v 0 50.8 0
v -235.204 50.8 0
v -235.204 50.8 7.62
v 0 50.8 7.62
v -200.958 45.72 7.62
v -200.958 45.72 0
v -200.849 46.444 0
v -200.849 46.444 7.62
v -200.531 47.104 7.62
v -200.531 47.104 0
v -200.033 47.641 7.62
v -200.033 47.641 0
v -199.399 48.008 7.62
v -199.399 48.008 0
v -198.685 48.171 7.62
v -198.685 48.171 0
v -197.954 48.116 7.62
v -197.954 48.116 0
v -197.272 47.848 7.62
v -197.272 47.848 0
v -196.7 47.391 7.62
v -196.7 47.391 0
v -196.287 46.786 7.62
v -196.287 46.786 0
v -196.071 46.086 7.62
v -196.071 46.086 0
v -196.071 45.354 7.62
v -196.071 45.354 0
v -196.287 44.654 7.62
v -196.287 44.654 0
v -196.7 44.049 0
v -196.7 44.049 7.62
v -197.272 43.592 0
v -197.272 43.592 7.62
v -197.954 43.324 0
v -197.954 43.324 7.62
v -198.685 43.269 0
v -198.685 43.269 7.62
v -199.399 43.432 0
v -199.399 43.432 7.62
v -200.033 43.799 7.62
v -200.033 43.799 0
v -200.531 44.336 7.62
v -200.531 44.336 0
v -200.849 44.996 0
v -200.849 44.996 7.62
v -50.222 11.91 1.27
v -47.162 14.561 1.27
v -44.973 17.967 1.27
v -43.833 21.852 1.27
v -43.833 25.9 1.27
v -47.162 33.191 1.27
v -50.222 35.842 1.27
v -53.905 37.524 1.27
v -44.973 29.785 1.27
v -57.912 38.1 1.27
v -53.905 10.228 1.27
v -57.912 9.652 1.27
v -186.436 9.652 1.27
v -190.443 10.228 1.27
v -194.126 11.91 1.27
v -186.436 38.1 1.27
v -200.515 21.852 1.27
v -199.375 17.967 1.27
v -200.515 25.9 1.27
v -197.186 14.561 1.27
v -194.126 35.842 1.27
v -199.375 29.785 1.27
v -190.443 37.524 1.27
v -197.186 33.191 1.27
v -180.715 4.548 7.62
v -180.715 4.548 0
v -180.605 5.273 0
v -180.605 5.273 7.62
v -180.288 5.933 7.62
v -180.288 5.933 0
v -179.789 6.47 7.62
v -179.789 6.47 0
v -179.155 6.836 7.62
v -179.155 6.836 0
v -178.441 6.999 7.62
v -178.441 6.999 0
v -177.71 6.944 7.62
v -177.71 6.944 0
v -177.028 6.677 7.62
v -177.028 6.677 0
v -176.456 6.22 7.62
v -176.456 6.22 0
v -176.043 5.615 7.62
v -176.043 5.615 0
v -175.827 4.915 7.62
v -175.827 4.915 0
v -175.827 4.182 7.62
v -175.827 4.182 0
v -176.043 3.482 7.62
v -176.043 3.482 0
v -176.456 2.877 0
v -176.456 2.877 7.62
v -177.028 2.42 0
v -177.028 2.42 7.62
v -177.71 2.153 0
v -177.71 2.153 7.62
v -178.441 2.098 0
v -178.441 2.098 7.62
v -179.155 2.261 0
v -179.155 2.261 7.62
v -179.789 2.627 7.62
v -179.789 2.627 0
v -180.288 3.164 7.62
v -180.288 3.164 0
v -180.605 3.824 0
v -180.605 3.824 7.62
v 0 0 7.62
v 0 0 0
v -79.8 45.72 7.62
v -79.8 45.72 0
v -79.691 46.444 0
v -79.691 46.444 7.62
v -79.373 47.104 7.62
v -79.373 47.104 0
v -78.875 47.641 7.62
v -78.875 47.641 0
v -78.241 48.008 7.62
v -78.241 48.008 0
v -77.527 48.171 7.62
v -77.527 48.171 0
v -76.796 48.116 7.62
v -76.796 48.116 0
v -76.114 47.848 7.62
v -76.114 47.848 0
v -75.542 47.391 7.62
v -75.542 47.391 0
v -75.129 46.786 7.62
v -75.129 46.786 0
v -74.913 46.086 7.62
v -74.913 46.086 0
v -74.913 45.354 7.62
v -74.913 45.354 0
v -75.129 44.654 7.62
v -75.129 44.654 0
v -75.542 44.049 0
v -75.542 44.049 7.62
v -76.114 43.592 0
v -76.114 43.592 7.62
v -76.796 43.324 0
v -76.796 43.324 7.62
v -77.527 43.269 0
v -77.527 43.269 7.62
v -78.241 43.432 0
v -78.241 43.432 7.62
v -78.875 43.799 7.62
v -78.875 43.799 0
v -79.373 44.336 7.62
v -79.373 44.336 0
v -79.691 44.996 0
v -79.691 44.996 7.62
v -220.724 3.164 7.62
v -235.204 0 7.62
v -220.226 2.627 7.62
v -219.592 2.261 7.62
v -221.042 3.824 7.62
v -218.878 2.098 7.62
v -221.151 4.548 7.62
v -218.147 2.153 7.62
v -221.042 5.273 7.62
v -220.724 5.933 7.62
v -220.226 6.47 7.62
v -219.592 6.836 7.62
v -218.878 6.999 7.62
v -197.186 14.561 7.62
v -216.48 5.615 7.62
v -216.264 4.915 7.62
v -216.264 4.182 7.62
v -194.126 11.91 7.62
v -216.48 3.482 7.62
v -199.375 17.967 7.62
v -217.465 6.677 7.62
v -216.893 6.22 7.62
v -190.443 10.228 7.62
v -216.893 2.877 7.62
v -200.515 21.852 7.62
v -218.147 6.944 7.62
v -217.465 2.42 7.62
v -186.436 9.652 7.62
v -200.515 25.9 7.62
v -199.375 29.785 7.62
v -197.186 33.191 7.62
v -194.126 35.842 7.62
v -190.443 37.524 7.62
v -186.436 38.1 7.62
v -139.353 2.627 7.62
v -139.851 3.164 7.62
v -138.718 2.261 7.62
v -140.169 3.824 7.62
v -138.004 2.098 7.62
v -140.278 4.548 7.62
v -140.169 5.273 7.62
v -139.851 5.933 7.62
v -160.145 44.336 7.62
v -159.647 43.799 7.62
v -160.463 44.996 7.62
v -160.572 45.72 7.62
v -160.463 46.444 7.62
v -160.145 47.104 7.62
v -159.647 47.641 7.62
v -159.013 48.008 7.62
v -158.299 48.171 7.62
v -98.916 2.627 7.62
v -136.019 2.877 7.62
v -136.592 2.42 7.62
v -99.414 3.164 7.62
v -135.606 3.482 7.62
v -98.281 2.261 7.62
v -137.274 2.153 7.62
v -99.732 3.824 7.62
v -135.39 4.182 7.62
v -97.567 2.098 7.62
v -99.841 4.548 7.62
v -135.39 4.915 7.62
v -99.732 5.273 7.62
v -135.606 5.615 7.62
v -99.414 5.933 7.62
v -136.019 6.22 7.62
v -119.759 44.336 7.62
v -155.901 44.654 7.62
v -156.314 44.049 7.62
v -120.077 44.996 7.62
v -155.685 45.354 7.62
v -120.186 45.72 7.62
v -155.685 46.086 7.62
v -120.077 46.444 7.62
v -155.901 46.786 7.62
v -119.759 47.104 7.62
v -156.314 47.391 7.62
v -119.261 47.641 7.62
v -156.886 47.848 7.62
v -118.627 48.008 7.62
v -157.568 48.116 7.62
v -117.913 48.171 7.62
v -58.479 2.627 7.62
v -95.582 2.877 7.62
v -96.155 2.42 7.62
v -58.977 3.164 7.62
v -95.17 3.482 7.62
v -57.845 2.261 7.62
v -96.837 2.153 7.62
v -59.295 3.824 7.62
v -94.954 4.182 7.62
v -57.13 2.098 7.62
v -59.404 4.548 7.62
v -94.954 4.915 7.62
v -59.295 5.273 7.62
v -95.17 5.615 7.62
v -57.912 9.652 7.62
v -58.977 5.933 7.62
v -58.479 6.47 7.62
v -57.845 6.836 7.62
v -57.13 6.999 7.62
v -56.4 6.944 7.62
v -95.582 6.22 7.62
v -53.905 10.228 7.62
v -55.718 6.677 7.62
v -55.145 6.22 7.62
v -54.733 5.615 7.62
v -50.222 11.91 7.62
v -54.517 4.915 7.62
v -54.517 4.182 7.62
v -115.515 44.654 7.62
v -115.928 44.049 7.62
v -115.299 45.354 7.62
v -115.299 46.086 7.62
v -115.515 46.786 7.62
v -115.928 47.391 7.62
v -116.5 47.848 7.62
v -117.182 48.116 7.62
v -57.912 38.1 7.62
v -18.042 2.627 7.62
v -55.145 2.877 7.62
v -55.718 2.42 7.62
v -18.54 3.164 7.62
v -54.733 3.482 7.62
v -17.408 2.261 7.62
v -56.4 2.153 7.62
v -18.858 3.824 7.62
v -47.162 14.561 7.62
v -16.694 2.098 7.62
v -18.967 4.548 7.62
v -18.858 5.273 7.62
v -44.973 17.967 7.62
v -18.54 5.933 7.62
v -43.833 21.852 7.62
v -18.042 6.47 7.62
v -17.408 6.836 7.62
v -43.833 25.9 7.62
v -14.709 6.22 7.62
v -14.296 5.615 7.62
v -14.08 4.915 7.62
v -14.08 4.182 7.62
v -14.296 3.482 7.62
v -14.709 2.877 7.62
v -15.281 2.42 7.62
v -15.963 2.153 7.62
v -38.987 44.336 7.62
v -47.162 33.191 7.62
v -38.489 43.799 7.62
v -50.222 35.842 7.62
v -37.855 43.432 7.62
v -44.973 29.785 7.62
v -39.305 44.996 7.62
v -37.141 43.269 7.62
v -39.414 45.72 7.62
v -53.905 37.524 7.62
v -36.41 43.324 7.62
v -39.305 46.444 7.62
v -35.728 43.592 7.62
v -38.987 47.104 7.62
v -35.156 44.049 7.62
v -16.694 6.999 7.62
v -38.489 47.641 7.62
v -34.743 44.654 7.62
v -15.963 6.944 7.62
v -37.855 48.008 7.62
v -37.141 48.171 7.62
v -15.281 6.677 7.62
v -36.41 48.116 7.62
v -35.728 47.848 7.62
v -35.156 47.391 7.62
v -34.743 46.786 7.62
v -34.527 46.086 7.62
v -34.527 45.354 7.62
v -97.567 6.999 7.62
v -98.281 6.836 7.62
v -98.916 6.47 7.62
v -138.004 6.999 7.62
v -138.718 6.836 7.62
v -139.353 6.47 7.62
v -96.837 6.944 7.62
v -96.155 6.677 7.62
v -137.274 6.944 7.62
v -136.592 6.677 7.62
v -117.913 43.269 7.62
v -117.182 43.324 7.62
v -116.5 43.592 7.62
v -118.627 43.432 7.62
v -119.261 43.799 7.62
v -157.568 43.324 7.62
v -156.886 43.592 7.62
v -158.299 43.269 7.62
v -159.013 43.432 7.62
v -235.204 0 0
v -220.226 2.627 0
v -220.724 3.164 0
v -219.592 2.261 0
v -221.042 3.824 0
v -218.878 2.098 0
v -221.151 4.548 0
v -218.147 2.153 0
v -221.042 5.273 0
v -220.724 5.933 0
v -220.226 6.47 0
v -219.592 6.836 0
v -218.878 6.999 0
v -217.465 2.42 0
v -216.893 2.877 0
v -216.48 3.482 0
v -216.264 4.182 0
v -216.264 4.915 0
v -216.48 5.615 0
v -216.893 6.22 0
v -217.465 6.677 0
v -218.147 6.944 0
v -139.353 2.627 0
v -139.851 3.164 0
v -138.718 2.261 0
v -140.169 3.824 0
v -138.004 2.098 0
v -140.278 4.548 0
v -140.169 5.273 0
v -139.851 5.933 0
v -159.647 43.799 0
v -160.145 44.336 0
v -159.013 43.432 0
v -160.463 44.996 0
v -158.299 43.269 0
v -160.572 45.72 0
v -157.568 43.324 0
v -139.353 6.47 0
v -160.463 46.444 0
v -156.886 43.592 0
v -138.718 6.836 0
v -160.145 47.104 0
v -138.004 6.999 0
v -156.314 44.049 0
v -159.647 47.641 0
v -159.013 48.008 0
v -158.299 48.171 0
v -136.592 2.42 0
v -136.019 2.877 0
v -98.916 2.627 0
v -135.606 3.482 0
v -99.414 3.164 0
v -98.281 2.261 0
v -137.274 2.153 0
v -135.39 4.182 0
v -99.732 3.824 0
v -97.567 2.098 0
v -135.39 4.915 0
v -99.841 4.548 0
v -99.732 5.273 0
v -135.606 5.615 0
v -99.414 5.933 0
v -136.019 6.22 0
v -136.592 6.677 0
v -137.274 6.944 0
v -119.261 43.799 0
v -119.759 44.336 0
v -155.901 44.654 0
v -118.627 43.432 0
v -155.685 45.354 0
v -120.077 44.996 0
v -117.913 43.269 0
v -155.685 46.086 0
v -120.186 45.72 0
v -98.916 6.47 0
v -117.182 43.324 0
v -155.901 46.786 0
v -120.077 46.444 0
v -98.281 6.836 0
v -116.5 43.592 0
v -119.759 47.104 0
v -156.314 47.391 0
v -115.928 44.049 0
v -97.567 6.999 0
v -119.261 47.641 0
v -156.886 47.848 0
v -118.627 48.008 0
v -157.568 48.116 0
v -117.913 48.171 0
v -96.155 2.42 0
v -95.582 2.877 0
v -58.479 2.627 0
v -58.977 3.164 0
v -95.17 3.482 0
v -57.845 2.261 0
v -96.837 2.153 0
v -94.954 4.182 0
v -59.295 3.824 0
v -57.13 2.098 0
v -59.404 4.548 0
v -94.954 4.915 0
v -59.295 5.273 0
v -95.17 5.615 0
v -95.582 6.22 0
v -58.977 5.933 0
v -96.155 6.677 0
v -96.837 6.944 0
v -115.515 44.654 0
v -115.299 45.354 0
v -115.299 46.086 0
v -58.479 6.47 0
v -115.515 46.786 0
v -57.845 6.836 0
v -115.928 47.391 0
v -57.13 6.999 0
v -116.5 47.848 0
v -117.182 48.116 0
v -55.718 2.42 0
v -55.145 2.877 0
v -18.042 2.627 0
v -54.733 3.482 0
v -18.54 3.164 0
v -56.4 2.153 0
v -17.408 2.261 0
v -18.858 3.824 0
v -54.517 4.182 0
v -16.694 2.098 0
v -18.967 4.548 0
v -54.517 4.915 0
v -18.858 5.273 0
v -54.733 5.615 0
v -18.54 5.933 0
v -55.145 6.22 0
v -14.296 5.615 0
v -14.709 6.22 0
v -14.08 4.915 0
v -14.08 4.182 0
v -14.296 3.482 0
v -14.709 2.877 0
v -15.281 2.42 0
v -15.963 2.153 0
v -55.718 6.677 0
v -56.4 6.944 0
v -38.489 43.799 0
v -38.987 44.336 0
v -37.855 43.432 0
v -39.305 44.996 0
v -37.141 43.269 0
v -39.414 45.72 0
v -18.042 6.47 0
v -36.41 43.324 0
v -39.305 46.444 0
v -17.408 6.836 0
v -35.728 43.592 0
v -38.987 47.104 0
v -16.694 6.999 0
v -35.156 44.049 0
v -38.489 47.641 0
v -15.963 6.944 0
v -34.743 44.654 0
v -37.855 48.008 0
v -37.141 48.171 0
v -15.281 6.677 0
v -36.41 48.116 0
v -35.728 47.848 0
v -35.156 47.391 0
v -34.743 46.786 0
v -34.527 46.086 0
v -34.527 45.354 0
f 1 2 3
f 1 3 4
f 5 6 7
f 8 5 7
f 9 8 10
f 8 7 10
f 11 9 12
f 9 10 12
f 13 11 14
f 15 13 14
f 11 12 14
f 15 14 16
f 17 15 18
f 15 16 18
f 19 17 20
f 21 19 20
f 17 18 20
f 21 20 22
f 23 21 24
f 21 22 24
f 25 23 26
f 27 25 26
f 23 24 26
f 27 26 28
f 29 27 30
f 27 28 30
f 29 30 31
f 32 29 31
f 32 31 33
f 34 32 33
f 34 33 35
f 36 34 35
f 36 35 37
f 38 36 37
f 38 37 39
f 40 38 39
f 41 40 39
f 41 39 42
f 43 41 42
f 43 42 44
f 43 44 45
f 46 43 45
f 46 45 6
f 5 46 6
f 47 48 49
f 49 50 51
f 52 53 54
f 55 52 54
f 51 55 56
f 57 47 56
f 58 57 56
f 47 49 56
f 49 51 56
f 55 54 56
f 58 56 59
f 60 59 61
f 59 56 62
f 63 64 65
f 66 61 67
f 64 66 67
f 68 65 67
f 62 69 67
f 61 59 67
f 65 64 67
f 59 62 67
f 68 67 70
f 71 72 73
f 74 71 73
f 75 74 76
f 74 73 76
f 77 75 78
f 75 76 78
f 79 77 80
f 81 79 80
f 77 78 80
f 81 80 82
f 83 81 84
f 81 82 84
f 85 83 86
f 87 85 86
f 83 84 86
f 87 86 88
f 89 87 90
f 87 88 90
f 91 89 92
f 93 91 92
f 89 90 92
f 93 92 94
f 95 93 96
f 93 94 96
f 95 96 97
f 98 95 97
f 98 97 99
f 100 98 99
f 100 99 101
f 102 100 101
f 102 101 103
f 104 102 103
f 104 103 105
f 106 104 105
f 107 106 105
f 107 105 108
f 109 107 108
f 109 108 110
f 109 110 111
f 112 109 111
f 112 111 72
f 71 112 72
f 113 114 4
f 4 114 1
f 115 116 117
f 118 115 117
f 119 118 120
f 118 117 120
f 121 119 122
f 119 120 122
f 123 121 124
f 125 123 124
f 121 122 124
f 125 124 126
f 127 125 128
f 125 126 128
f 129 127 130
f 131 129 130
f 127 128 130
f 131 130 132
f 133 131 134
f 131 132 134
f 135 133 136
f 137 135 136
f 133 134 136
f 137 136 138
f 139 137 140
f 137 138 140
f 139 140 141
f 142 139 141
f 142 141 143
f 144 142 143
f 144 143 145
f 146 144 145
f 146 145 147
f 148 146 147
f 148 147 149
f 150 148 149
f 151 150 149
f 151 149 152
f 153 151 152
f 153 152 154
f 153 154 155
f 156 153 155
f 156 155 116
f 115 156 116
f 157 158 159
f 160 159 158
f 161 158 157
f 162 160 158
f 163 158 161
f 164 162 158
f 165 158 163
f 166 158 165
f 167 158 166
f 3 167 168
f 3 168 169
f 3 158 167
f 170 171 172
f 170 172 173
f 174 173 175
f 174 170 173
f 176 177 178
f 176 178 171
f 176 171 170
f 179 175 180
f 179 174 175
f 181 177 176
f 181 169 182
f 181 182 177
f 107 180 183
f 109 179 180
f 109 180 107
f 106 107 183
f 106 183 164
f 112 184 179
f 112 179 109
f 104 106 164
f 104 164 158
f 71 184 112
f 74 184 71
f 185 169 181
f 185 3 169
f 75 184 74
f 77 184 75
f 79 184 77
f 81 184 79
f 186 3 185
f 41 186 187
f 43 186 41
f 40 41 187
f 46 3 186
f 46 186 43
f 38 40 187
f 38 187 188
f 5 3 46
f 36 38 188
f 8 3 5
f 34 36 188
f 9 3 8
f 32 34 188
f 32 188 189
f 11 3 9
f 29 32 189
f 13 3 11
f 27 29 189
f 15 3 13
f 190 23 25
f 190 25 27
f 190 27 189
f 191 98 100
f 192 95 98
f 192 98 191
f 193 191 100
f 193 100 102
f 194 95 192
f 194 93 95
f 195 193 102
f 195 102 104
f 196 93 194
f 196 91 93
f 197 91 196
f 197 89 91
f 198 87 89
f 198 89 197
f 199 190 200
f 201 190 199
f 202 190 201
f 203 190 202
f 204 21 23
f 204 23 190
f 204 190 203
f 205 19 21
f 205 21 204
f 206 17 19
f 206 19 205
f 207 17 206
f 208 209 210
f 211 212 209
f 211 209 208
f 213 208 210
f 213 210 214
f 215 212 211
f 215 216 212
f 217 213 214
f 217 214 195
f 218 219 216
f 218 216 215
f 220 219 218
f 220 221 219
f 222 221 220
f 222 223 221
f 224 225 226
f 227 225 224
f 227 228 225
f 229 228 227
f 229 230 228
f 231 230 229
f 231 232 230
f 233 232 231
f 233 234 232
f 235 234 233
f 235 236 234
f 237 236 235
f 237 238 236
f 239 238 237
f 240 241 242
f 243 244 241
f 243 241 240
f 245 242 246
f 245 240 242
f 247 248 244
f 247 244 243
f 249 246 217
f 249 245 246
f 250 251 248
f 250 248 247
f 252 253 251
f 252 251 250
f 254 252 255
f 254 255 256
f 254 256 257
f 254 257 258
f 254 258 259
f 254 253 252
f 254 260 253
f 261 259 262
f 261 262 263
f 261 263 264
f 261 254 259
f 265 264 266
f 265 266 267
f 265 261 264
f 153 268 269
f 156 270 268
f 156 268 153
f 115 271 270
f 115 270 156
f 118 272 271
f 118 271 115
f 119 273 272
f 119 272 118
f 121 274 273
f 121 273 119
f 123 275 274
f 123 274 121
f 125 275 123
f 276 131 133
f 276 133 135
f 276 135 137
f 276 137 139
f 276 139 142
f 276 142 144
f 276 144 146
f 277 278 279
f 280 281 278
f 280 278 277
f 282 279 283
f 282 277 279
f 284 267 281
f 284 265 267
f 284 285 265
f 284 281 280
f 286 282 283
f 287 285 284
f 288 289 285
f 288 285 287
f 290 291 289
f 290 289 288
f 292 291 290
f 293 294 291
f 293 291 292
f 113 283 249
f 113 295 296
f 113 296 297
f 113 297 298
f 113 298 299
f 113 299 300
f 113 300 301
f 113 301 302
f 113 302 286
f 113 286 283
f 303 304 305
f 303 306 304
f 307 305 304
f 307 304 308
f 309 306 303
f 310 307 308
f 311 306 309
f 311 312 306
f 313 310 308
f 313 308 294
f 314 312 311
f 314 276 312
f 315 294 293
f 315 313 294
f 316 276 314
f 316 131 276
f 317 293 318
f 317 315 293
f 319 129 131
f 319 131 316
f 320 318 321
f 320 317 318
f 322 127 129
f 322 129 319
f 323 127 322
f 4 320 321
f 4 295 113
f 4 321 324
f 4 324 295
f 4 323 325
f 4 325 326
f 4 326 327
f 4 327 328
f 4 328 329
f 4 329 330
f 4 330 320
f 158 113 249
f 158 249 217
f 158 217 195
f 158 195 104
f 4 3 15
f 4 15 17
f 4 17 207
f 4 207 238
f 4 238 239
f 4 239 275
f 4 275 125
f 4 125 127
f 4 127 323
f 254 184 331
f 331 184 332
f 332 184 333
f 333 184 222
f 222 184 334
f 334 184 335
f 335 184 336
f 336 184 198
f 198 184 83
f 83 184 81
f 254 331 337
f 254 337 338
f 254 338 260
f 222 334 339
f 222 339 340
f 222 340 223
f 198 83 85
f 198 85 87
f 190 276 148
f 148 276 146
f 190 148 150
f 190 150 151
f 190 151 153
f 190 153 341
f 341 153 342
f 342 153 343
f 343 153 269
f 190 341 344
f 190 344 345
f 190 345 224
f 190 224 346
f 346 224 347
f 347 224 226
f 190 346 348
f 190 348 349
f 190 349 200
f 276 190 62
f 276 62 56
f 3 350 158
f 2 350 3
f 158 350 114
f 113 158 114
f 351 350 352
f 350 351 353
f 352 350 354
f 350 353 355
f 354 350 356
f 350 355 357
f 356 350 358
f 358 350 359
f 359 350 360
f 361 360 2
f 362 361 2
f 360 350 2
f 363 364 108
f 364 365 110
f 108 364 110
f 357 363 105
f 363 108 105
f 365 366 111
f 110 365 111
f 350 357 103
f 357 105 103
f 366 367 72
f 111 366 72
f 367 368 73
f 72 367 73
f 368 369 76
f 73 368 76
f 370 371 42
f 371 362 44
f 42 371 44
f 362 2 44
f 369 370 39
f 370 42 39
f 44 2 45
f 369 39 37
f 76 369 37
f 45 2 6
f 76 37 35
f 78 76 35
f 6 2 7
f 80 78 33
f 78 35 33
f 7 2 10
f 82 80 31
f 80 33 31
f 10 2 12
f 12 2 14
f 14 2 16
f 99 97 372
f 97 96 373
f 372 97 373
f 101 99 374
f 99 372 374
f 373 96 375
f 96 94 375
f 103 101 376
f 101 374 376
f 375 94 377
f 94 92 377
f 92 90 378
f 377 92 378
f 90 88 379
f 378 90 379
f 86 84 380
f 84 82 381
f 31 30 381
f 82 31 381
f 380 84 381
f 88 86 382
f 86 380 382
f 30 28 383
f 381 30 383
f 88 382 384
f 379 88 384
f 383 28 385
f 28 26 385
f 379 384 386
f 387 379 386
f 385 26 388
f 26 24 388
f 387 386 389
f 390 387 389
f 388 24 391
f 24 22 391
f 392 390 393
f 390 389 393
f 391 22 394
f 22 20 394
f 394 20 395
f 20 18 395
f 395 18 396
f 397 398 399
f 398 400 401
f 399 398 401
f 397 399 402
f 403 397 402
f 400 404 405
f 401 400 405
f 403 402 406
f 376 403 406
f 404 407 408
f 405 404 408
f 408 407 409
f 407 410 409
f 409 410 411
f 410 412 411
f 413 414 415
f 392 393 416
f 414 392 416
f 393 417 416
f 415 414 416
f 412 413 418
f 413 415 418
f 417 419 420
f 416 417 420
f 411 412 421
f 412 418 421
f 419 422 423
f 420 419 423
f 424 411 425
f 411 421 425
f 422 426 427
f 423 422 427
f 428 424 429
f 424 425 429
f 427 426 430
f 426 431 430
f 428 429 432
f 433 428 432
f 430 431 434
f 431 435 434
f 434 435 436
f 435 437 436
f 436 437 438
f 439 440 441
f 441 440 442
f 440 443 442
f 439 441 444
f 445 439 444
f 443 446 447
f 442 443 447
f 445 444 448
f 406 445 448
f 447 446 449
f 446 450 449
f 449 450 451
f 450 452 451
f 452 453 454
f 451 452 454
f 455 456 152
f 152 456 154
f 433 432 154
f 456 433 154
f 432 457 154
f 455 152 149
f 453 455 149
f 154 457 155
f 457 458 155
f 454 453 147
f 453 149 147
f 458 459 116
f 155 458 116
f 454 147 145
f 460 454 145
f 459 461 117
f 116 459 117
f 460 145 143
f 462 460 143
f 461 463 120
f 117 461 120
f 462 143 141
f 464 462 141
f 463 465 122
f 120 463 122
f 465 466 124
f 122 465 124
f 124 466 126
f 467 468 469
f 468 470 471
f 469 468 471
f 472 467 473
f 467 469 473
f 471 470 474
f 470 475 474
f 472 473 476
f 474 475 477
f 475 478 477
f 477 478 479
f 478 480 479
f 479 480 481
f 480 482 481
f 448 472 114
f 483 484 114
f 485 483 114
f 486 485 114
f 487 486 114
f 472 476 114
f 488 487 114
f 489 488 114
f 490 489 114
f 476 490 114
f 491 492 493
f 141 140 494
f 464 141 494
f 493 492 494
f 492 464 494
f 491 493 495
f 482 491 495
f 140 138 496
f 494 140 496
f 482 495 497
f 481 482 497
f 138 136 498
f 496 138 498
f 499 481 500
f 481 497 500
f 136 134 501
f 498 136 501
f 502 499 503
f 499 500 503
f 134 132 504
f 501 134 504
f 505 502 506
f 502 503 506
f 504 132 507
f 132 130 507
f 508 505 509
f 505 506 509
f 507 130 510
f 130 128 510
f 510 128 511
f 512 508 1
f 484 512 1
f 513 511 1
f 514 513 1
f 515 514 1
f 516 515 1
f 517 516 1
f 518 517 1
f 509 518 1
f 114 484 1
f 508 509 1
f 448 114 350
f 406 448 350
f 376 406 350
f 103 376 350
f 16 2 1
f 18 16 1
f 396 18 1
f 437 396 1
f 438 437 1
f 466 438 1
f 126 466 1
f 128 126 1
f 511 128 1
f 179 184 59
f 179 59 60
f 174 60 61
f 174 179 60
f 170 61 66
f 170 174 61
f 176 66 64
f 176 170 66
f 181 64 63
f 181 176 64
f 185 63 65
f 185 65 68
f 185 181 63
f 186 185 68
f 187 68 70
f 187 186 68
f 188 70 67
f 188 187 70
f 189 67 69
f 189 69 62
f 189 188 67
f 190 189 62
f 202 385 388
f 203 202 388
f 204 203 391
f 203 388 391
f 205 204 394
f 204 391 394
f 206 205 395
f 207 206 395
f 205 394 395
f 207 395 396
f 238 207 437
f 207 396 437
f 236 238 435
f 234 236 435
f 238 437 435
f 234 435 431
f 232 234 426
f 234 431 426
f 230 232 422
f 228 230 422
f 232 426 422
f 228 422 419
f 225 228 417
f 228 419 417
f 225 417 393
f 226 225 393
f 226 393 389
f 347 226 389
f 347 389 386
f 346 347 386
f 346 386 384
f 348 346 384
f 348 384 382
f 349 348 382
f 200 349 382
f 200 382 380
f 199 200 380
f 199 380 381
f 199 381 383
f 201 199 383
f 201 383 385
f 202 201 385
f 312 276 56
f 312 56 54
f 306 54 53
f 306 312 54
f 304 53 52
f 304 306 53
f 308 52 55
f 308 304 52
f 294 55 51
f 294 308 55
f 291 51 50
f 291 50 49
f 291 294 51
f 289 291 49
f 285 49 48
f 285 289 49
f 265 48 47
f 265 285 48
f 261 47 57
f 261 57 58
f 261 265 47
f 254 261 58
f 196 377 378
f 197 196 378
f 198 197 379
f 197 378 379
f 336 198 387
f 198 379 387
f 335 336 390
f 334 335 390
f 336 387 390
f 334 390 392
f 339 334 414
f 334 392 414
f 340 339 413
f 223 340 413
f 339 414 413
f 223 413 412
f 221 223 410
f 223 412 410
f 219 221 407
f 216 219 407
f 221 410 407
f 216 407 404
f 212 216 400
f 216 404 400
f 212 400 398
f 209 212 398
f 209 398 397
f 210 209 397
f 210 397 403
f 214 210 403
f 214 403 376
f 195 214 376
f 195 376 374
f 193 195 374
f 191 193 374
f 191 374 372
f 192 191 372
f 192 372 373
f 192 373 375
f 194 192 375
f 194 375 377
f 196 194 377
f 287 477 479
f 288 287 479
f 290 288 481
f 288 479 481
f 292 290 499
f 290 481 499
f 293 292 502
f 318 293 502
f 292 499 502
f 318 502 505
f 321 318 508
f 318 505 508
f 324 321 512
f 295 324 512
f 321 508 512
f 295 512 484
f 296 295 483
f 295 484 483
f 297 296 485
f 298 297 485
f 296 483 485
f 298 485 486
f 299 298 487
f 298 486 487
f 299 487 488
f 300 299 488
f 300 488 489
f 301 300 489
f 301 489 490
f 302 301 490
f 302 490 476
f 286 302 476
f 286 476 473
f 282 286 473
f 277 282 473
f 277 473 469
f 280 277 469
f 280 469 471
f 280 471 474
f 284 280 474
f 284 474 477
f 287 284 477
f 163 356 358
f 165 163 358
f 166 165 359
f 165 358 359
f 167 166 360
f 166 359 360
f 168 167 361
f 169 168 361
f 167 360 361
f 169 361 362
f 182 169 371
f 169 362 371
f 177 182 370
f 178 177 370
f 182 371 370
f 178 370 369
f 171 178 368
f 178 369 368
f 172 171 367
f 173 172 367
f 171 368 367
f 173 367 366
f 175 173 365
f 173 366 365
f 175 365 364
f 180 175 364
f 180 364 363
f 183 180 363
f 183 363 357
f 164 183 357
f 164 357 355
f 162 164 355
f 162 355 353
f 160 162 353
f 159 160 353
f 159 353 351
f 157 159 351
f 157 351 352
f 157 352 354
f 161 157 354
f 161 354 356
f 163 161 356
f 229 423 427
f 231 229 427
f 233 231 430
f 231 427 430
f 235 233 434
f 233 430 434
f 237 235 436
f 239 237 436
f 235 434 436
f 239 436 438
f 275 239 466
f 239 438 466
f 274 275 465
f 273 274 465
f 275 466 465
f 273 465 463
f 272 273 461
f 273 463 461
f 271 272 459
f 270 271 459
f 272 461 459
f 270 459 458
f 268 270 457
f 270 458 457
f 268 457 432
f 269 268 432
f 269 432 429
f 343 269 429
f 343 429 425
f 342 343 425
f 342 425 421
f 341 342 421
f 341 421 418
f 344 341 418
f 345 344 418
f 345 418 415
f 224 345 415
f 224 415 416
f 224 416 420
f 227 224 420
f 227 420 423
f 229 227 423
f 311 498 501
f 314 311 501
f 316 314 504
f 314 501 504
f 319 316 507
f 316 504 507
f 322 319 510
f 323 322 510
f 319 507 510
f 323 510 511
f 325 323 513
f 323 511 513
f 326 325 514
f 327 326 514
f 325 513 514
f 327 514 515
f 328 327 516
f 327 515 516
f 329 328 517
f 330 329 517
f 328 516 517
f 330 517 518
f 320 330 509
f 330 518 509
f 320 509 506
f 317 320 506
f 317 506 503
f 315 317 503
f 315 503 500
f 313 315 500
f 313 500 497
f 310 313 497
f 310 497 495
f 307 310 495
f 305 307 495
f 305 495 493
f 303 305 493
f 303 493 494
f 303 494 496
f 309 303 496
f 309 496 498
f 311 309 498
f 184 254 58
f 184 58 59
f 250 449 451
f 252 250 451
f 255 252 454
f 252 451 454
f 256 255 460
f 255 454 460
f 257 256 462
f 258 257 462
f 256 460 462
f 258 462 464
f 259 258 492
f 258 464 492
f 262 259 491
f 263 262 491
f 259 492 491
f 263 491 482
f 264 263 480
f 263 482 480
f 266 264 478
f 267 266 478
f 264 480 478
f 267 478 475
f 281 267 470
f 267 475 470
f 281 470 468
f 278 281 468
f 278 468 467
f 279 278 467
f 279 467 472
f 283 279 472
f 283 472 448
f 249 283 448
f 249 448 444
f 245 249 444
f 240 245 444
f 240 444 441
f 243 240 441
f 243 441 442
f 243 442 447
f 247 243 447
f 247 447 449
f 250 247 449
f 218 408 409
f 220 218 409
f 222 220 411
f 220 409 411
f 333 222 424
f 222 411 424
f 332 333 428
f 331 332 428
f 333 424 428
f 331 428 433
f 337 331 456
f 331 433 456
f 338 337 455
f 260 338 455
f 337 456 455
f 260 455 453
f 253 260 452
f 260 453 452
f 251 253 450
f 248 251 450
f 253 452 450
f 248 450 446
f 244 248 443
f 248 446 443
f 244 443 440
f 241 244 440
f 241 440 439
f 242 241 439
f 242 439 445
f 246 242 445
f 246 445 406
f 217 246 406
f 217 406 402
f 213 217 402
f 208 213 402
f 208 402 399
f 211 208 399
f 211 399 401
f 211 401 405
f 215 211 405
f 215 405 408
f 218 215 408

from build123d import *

# Parameters (mm, degrees)
SKETCH5_W                    = 235.204
SKETCH5_H                    = 50.8
BOSS_EXTRUDE3_DEPTH          = 7.62
CUT_EXTRUDE3_DEPTH           = 6.35
F_10_0_1935_DIAMETER_HOLE1_D = 4.9149


with BuildPart() as part:
    # Sketch5 → Boss-Extrude3 (new body)
    with BuildSketch(Plane.XY):
        with Locations((-117.602, 25.4)):
            Rectangle(SKETCH5_W, SKETCH5_H)
    extrude(amount=BOSS_EXTRUDE3_DEPTH)

    # Sketch6 → Cut-Extrude3 (cut)
    with BuildSketch(Plane.XY.offset(7.62)):
        with BuildLine():
            Line((-57.912, 9.652), (-186.436, 9.652))
            ThreePointArc((-186.436, 9.652), (-200.66, 23.876), (-186.436, 38.1))
            Line((-186.436, 38.1), (-57.912, 38.1))
            ThreePointArc((-57.912, 38.1), (-43.688, 23.876), (-57.912, 9.652))
        make_face()
    extrude(amount=-CUT_EXTRUDE3_DEPTH, mode=Mode.SUBTRACT)

    # #10 (0.1935) Diameter Hole1 (through all)
    with Locations(Plane(origin=(-198.501, 45.72, 7.62), x_dir=(1, 0, 0), z_dir=(0, 0, 1))):
        with Locations((0, 0), (40.386, 0), (80.772, 0), (121.158, 0), (161.544, 0), (-20.193, -41.171520692), (20.2438, -41.171520692), (60.6806, -41.171520692), (101.1174, -41.171520692), (141.5542, -41.171520692), (181.991, -41.171520692)):
            Hole(F_10_0_1935_DIAMETER_HOLE1_D / 2)


solid = part.part
